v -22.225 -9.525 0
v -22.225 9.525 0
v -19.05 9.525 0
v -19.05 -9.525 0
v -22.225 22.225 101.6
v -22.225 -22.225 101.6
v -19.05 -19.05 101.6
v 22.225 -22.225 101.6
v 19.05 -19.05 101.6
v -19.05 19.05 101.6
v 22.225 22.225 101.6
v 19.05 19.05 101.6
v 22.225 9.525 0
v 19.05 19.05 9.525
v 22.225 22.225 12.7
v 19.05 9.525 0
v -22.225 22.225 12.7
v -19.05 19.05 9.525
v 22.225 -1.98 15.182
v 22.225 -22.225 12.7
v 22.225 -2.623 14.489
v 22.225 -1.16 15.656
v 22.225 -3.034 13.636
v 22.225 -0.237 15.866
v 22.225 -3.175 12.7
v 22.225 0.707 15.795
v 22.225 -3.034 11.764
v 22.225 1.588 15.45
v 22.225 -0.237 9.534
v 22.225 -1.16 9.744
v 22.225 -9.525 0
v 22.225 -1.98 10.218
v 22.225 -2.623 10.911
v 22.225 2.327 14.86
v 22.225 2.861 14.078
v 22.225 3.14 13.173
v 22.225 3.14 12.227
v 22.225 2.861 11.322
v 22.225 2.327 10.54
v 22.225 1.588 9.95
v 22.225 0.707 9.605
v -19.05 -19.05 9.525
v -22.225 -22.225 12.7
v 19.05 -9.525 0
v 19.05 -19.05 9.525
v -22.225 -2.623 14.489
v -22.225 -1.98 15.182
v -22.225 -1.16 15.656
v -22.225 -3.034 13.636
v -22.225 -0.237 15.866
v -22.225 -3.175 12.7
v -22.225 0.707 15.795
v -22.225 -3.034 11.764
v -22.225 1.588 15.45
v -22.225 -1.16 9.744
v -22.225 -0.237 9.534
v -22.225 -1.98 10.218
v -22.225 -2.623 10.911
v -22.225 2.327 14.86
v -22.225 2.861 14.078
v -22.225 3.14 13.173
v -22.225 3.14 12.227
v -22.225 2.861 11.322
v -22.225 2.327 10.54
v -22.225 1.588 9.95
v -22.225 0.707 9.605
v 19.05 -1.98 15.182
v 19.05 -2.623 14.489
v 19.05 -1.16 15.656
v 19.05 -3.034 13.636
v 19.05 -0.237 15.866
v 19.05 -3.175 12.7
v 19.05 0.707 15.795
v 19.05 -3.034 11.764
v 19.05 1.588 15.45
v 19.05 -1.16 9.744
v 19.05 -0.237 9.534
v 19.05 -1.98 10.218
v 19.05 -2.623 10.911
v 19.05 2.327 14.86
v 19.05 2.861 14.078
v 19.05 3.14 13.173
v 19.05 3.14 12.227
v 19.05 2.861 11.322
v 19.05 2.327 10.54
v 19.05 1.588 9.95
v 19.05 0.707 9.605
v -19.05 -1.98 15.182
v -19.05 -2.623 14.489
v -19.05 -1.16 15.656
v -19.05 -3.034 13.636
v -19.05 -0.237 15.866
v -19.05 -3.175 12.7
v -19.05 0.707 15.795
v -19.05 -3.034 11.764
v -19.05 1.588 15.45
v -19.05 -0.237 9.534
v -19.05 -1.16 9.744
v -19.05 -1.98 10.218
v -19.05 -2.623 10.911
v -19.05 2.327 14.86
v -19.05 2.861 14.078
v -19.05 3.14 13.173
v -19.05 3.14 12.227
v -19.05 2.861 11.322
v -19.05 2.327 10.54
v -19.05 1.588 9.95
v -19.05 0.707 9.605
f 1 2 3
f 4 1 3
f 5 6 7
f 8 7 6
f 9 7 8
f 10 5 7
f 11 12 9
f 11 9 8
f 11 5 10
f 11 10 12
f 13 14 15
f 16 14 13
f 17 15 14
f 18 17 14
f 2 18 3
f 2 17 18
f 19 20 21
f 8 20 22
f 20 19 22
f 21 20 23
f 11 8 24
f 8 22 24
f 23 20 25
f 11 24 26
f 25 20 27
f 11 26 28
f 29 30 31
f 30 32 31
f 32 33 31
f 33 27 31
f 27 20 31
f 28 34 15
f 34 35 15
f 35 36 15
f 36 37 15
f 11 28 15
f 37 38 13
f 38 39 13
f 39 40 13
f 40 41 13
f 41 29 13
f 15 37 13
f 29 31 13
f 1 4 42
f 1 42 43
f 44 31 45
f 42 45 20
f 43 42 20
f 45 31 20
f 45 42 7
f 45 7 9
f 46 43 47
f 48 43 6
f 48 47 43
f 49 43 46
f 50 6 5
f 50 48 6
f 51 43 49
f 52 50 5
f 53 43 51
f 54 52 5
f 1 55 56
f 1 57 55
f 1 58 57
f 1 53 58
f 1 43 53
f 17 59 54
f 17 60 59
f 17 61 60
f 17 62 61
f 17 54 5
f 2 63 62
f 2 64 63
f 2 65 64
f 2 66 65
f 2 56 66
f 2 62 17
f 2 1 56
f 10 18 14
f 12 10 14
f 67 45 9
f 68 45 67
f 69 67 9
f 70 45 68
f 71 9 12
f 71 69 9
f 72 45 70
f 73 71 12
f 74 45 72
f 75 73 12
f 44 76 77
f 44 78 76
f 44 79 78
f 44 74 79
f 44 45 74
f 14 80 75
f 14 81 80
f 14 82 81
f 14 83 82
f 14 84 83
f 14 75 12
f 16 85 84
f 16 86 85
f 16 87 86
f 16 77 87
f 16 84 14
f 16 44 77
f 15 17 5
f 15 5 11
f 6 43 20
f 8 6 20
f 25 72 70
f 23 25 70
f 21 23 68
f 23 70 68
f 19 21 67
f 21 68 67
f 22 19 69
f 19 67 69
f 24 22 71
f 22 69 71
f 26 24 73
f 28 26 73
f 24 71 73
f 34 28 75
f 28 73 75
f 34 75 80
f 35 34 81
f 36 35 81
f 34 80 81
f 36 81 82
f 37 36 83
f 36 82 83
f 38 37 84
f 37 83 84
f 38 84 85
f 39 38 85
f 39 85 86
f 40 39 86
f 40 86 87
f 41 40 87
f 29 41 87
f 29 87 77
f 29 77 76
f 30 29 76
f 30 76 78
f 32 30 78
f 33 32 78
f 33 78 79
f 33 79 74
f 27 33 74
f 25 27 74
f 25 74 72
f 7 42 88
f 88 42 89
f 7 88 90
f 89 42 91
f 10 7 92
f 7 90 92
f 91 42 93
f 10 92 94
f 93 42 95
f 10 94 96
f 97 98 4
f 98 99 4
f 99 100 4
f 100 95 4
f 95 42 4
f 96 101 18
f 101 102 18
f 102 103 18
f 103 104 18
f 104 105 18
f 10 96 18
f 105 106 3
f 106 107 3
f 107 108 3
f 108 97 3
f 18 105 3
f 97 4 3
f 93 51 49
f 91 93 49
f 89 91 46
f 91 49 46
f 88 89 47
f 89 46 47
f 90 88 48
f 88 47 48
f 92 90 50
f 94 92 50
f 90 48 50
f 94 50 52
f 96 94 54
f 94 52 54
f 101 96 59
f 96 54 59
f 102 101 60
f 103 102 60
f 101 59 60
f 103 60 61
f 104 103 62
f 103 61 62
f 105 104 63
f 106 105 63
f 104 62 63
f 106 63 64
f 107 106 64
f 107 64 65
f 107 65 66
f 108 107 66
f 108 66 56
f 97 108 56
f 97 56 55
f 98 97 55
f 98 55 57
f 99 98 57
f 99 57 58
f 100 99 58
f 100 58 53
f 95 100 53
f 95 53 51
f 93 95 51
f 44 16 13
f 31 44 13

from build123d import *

# Parameters (mm, degrees)
SKETCH2_W           = 44.45
SKETCH2_H           = 44.45
SKETCH2_W_2         = 38.1
SKETCH2_H_2         = 38.1
BOSS_EXTRUDE1_DEPTH = 101.6
SKETCH5_R           = 3.175
CUT_EXTRUDE1_DEPTH  = 54.864
CHAMFER1_SIZE       = 12.7


with BuildPart() as part:
    # Sketch2 → Boss-Extrude1 (new body)
    with BuildSketch(Plane.XY):
        Rectangle(SKETCH2_W, SKETCH2_H)
        Rectangle(SKETCH2_W_2, SKETCH2_H_2, mode=Mode.SUBTRACT)
    extrude(amount=BOSS_EXTRUDE1_DEPTH)

    # Sketch5 → Cut-Extrude1 (cut)
    with BuildSketch(Plane.ZY.offset(22.225)):
        with Locations(Location((12.7, 0, 0), (0, 0, 270))):
            Circle(SKETCH5_R)
    extrude(amount=-CUT_EXTRUDE1_DEPTH, mode=Mode.SUBTRACT)

    # Chamfer1
    # the kernel refuses this chamfer: 12.7 mm, written as the material it takes off along each edge
    with BuildSketch(Plane(origin=(54.885373947, -22.225, 0), x_dir=(0, 0.9996219169112966, -0.02749587661058637), z_dir=(-1, 0, 0))) as chamfer1_piece_1:
        Polygon((CHAMFER1_SIZE * 0.999621916911, -CHAMFER1_SIZE * 0.0274958766106), (-CHAMFER1_SIZE * 0.0274958766106, -CHAMFER1_SIZE * 0.999621916911), (0, 0), align=None)
    extrude(amount=109.770747894, mode=Mode.SUBTRACT)
    with BuildSketch(Plane(origin=(-54.885373947, 22.225, 0), x_dir=(0, 0.02749587661058647, 0.9996219169112966), z_dir=(1, 0, 0))) as chamfer1_piece_2:
        Polygon((CHAMFER1_SIZE * 0.999621916911, CHAMFER1_SIZE * 0.0274958766106), (-CHAMFER1_SIZE * 0.0274958766106, CHAMFER1_SIZE * 0.999621916911), (0, 0), align=None)
    extrude(amount=109.770747894, mode=Mode.SUBTRACT)


solid = part.part
